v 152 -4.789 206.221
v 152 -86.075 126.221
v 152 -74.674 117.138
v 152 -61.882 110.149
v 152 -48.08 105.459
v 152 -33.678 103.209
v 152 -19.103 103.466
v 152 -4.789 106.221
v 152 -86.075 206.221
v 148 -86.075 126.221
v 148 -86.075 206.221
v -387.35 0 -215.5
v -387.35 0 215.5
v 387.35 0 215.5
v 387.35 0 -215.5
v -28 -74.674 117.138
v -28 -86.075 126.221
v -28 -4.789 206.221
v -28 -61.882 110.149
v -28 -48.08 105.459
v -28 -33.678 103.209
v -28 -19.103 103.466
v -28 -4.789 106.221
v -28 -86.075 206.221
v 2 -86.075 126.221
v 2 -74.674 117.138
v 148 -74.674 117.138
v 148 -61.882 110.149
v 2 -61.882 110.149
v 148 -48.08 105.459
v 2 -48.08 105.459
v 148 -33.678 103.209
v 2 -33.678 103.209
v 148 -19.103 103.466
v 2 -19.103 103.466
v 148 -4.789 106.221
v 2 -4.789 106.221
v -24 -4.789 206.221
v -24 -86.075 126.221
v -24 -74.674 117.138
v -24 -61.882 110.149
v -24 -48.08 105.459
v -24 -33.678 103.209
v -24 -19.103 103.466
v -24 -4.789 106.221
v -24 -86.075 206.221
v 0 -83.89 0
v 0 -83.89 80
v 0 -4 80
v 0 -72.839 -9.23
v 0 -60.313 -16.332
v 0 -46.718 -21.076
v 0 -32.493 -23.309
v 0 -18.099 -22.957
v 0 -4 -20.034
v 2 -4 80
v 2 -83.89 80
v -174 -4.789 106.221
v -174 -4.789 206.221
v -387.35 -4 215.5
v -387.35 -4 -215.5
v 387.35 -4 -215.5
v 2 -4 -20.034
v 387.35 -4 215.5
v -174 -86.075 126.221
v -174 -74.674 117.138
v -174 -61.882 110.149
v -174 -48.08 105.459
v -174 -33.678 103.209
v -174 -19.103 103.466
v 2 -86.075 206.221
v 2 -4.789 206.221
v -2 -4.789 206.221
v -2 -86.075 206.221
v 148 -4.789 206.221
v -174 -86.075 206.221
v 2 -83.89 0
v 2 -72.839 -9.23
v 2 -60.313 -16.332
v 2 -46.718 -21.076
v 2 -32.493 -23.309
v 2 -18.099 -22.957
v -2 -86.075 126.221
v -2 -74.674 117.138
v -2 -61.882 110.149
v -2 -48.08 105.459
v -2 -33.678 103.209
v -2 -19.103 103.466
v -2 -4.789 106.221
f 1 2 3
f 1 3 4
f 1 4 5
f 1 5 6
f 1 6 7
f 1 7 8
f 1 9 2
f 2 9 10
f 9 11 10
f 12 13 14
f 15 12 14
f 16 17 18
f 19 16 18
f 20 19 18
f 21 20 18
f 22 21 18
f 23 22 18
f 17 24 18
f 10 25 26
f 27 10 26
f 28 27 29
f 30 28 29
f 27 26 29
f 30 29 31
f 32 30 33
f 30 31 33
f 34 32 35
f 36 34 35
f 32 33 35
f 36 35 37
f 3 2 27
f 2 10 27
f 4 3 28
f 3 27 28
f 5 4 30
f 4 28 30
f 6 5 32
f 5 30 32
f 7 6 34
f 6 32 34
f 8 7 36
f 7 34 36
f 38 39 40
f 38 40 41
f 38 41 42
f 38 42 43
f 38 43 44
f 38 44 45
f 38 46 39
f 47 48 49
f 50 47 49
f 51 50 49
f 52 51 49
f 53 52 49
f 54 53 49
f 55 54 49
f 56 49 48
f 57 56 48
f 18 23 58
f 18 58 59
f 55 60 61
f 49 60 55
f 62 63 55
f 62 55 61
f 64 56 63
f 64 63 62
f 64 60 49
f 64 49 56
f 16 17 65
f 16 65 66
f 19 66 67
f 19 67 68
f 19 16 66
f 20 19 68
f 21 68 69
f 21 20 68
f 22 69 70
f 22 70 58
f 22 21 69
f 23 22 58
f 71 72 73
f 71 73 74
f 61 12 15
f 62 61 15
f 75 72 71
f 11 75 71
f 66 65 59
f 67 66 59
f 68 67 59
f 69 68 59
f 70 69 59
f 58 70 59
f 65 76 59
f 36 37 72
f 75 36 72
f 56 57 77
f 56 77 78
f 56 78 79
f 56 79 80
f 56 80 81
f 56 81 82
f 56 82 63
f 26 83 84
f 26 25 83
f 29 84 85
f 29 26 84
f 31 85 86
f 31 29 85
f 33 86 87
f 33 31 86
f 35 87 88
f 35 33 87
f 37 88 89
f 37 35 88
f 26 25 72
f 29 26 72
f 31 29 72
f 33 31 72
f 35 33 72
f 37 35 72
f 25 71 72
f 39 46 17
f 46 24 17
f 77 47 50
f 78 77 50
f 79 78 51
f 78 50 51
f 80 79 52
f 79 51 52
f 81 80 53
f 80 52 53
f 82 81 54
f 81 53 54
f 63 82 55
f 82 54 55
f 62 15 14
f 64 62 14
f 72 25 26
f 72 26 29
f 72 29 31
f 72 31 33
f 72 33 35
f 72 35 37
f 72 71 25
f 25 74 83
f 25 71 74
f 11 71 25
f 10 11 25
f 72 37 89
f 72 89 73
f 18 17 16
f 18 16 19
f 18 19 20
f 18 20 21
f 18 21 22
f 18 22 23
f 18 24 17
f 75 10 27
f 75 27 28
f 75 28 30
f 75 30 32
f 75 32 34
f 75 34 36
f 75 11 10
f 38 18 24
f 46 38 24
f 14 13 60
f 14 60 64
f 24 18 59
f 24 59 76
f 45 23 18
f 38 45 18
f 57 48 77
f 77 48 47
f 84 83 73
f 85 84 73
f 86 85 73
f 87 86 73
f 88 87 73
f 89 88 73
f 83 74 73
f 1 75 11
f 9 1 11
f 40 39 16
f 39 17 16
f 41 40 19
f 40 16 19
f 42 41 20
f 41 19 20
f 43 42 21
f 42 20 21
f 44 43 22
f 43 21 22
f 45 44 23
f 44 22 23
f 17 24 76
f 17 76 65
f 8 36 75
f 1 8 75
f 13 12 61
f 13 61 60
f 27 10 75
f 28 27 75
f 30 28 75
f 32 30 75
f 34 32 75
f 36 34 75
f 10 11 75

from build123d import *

# Parameters (mm, degrees)
F0_W          = 774.7
F0_H          = 431
F1_DEPTH      = 4
F3_DEPTH      = 2
F3_DEPTH_BACK = 2
F7_DEPTH      = 146
F9_DEPTH      = 2


# Not quite as in the source:
# - a pattern or mirror of a feature is missing from the dataset's text; its kind, count and spacing are read off the source's solid


with BuildPart() as f1:
    # F0 (on Front) → F1 (new body)
    with BuildSketch(Plane.XZ):
        Rectangle(F0_W, F0_H)
    extrude(amount=F1_DEPTH)

    # F8 (on Right) → F9 (join)
    with BuildSketch(Plane.YZ):
        with BuildLine():
            ThreePointArc((-83.8898100026, 0), (-46.6623748041, -21.0902592062), (-3.8898100026, -20))
            Line((-3.8898100026, -20), (-3.8898100026, 80))
            Line((-3.8898100026, 80), (-83.8898100026, 80))
            Line((-83.8898100026, 80), (-83.8898100026, 0))
        make_face()
    extrude(amount=F9_DEPTH)


with BuildPart() as f3:
    # F2 (on Right) → F3 (new body, two sides)
    with BuildSketch(Plane.YZ) as f3_sk:
        with BuildLine():
            ThreePointArc((-86.0752825102, 126.2208398572), (-48.079888449, 105.4589891292), (-4.7887346299, 106.2208398572))
            Line((-4.7887346299, 106.2208398572), (-4.7887346299, 206.2208398572))
            Line((-4.7887346299, 206.2208398572), (-86.0752825102, 206.2208398572))
            Line((-86.0752825102, 206.2208398572), (-86.0752825102, 126.2208398572))
        make_face()
    extrude(amount=F3_DEPTH)
    extrude(f3_sk.sketch, amount=-F3_DEPTH_BACK)


with BuildPart() as f3_copies_1:
    # F3_copies: instance of F3
    add(f3.part.mirror(Plane(origin=(-15, 0, 0), x_dir=(0, 0, -1), z_dir=(-1, 0, 0))))



with BuildPart() as f3_copies1_1:
    # F3_copies1: instance of F3
    add(f3.part.mirror(Plane(origin=(-13, 0, 0), x_dir=(0, 0, -1), z_dir=(-1, 0, 0))))


with BuildPart() as f3_copies2_1:
    # F3_copies2: instance of F3
    add(f3.part.mirror(Plane(origin=(-86, 0, 0), x_dir=(0, 0, -1), z_dir=(-1, 0, 0))))


with BuildPart() as f5_1:
    # F5: instance of F3
    add(f3.part.mirror(Plane.YZ.offset(75)))


with BuildPart() as f7:
    # F7 (new): a face of the model
    f7_faces = [f3.part.faces().sort_by_distance(p)[0] for p in [
        (2, -44.1296538263, 157.155690045),
    ]]
    extrude(f7_faces, amount=F7_DEPTH)


with BuildPart() as f3_copies_1_1:
    add(f3_copies_1.part)

    add(f3_copies2_1.part)  # F7_copies merges F3_copies2_1
    # F7_copies: F7 across plane
    add(f7.part.mirror(Plane(origin=(-13, 0, 0), x_dir=(0, 0, -1), z_dir=(-1, 0, 0))))


solid = Compound([f1.part, f3.part, f3_copies1_1.part, f5_1.part, f7.part, f3_copies_1_1.part])
